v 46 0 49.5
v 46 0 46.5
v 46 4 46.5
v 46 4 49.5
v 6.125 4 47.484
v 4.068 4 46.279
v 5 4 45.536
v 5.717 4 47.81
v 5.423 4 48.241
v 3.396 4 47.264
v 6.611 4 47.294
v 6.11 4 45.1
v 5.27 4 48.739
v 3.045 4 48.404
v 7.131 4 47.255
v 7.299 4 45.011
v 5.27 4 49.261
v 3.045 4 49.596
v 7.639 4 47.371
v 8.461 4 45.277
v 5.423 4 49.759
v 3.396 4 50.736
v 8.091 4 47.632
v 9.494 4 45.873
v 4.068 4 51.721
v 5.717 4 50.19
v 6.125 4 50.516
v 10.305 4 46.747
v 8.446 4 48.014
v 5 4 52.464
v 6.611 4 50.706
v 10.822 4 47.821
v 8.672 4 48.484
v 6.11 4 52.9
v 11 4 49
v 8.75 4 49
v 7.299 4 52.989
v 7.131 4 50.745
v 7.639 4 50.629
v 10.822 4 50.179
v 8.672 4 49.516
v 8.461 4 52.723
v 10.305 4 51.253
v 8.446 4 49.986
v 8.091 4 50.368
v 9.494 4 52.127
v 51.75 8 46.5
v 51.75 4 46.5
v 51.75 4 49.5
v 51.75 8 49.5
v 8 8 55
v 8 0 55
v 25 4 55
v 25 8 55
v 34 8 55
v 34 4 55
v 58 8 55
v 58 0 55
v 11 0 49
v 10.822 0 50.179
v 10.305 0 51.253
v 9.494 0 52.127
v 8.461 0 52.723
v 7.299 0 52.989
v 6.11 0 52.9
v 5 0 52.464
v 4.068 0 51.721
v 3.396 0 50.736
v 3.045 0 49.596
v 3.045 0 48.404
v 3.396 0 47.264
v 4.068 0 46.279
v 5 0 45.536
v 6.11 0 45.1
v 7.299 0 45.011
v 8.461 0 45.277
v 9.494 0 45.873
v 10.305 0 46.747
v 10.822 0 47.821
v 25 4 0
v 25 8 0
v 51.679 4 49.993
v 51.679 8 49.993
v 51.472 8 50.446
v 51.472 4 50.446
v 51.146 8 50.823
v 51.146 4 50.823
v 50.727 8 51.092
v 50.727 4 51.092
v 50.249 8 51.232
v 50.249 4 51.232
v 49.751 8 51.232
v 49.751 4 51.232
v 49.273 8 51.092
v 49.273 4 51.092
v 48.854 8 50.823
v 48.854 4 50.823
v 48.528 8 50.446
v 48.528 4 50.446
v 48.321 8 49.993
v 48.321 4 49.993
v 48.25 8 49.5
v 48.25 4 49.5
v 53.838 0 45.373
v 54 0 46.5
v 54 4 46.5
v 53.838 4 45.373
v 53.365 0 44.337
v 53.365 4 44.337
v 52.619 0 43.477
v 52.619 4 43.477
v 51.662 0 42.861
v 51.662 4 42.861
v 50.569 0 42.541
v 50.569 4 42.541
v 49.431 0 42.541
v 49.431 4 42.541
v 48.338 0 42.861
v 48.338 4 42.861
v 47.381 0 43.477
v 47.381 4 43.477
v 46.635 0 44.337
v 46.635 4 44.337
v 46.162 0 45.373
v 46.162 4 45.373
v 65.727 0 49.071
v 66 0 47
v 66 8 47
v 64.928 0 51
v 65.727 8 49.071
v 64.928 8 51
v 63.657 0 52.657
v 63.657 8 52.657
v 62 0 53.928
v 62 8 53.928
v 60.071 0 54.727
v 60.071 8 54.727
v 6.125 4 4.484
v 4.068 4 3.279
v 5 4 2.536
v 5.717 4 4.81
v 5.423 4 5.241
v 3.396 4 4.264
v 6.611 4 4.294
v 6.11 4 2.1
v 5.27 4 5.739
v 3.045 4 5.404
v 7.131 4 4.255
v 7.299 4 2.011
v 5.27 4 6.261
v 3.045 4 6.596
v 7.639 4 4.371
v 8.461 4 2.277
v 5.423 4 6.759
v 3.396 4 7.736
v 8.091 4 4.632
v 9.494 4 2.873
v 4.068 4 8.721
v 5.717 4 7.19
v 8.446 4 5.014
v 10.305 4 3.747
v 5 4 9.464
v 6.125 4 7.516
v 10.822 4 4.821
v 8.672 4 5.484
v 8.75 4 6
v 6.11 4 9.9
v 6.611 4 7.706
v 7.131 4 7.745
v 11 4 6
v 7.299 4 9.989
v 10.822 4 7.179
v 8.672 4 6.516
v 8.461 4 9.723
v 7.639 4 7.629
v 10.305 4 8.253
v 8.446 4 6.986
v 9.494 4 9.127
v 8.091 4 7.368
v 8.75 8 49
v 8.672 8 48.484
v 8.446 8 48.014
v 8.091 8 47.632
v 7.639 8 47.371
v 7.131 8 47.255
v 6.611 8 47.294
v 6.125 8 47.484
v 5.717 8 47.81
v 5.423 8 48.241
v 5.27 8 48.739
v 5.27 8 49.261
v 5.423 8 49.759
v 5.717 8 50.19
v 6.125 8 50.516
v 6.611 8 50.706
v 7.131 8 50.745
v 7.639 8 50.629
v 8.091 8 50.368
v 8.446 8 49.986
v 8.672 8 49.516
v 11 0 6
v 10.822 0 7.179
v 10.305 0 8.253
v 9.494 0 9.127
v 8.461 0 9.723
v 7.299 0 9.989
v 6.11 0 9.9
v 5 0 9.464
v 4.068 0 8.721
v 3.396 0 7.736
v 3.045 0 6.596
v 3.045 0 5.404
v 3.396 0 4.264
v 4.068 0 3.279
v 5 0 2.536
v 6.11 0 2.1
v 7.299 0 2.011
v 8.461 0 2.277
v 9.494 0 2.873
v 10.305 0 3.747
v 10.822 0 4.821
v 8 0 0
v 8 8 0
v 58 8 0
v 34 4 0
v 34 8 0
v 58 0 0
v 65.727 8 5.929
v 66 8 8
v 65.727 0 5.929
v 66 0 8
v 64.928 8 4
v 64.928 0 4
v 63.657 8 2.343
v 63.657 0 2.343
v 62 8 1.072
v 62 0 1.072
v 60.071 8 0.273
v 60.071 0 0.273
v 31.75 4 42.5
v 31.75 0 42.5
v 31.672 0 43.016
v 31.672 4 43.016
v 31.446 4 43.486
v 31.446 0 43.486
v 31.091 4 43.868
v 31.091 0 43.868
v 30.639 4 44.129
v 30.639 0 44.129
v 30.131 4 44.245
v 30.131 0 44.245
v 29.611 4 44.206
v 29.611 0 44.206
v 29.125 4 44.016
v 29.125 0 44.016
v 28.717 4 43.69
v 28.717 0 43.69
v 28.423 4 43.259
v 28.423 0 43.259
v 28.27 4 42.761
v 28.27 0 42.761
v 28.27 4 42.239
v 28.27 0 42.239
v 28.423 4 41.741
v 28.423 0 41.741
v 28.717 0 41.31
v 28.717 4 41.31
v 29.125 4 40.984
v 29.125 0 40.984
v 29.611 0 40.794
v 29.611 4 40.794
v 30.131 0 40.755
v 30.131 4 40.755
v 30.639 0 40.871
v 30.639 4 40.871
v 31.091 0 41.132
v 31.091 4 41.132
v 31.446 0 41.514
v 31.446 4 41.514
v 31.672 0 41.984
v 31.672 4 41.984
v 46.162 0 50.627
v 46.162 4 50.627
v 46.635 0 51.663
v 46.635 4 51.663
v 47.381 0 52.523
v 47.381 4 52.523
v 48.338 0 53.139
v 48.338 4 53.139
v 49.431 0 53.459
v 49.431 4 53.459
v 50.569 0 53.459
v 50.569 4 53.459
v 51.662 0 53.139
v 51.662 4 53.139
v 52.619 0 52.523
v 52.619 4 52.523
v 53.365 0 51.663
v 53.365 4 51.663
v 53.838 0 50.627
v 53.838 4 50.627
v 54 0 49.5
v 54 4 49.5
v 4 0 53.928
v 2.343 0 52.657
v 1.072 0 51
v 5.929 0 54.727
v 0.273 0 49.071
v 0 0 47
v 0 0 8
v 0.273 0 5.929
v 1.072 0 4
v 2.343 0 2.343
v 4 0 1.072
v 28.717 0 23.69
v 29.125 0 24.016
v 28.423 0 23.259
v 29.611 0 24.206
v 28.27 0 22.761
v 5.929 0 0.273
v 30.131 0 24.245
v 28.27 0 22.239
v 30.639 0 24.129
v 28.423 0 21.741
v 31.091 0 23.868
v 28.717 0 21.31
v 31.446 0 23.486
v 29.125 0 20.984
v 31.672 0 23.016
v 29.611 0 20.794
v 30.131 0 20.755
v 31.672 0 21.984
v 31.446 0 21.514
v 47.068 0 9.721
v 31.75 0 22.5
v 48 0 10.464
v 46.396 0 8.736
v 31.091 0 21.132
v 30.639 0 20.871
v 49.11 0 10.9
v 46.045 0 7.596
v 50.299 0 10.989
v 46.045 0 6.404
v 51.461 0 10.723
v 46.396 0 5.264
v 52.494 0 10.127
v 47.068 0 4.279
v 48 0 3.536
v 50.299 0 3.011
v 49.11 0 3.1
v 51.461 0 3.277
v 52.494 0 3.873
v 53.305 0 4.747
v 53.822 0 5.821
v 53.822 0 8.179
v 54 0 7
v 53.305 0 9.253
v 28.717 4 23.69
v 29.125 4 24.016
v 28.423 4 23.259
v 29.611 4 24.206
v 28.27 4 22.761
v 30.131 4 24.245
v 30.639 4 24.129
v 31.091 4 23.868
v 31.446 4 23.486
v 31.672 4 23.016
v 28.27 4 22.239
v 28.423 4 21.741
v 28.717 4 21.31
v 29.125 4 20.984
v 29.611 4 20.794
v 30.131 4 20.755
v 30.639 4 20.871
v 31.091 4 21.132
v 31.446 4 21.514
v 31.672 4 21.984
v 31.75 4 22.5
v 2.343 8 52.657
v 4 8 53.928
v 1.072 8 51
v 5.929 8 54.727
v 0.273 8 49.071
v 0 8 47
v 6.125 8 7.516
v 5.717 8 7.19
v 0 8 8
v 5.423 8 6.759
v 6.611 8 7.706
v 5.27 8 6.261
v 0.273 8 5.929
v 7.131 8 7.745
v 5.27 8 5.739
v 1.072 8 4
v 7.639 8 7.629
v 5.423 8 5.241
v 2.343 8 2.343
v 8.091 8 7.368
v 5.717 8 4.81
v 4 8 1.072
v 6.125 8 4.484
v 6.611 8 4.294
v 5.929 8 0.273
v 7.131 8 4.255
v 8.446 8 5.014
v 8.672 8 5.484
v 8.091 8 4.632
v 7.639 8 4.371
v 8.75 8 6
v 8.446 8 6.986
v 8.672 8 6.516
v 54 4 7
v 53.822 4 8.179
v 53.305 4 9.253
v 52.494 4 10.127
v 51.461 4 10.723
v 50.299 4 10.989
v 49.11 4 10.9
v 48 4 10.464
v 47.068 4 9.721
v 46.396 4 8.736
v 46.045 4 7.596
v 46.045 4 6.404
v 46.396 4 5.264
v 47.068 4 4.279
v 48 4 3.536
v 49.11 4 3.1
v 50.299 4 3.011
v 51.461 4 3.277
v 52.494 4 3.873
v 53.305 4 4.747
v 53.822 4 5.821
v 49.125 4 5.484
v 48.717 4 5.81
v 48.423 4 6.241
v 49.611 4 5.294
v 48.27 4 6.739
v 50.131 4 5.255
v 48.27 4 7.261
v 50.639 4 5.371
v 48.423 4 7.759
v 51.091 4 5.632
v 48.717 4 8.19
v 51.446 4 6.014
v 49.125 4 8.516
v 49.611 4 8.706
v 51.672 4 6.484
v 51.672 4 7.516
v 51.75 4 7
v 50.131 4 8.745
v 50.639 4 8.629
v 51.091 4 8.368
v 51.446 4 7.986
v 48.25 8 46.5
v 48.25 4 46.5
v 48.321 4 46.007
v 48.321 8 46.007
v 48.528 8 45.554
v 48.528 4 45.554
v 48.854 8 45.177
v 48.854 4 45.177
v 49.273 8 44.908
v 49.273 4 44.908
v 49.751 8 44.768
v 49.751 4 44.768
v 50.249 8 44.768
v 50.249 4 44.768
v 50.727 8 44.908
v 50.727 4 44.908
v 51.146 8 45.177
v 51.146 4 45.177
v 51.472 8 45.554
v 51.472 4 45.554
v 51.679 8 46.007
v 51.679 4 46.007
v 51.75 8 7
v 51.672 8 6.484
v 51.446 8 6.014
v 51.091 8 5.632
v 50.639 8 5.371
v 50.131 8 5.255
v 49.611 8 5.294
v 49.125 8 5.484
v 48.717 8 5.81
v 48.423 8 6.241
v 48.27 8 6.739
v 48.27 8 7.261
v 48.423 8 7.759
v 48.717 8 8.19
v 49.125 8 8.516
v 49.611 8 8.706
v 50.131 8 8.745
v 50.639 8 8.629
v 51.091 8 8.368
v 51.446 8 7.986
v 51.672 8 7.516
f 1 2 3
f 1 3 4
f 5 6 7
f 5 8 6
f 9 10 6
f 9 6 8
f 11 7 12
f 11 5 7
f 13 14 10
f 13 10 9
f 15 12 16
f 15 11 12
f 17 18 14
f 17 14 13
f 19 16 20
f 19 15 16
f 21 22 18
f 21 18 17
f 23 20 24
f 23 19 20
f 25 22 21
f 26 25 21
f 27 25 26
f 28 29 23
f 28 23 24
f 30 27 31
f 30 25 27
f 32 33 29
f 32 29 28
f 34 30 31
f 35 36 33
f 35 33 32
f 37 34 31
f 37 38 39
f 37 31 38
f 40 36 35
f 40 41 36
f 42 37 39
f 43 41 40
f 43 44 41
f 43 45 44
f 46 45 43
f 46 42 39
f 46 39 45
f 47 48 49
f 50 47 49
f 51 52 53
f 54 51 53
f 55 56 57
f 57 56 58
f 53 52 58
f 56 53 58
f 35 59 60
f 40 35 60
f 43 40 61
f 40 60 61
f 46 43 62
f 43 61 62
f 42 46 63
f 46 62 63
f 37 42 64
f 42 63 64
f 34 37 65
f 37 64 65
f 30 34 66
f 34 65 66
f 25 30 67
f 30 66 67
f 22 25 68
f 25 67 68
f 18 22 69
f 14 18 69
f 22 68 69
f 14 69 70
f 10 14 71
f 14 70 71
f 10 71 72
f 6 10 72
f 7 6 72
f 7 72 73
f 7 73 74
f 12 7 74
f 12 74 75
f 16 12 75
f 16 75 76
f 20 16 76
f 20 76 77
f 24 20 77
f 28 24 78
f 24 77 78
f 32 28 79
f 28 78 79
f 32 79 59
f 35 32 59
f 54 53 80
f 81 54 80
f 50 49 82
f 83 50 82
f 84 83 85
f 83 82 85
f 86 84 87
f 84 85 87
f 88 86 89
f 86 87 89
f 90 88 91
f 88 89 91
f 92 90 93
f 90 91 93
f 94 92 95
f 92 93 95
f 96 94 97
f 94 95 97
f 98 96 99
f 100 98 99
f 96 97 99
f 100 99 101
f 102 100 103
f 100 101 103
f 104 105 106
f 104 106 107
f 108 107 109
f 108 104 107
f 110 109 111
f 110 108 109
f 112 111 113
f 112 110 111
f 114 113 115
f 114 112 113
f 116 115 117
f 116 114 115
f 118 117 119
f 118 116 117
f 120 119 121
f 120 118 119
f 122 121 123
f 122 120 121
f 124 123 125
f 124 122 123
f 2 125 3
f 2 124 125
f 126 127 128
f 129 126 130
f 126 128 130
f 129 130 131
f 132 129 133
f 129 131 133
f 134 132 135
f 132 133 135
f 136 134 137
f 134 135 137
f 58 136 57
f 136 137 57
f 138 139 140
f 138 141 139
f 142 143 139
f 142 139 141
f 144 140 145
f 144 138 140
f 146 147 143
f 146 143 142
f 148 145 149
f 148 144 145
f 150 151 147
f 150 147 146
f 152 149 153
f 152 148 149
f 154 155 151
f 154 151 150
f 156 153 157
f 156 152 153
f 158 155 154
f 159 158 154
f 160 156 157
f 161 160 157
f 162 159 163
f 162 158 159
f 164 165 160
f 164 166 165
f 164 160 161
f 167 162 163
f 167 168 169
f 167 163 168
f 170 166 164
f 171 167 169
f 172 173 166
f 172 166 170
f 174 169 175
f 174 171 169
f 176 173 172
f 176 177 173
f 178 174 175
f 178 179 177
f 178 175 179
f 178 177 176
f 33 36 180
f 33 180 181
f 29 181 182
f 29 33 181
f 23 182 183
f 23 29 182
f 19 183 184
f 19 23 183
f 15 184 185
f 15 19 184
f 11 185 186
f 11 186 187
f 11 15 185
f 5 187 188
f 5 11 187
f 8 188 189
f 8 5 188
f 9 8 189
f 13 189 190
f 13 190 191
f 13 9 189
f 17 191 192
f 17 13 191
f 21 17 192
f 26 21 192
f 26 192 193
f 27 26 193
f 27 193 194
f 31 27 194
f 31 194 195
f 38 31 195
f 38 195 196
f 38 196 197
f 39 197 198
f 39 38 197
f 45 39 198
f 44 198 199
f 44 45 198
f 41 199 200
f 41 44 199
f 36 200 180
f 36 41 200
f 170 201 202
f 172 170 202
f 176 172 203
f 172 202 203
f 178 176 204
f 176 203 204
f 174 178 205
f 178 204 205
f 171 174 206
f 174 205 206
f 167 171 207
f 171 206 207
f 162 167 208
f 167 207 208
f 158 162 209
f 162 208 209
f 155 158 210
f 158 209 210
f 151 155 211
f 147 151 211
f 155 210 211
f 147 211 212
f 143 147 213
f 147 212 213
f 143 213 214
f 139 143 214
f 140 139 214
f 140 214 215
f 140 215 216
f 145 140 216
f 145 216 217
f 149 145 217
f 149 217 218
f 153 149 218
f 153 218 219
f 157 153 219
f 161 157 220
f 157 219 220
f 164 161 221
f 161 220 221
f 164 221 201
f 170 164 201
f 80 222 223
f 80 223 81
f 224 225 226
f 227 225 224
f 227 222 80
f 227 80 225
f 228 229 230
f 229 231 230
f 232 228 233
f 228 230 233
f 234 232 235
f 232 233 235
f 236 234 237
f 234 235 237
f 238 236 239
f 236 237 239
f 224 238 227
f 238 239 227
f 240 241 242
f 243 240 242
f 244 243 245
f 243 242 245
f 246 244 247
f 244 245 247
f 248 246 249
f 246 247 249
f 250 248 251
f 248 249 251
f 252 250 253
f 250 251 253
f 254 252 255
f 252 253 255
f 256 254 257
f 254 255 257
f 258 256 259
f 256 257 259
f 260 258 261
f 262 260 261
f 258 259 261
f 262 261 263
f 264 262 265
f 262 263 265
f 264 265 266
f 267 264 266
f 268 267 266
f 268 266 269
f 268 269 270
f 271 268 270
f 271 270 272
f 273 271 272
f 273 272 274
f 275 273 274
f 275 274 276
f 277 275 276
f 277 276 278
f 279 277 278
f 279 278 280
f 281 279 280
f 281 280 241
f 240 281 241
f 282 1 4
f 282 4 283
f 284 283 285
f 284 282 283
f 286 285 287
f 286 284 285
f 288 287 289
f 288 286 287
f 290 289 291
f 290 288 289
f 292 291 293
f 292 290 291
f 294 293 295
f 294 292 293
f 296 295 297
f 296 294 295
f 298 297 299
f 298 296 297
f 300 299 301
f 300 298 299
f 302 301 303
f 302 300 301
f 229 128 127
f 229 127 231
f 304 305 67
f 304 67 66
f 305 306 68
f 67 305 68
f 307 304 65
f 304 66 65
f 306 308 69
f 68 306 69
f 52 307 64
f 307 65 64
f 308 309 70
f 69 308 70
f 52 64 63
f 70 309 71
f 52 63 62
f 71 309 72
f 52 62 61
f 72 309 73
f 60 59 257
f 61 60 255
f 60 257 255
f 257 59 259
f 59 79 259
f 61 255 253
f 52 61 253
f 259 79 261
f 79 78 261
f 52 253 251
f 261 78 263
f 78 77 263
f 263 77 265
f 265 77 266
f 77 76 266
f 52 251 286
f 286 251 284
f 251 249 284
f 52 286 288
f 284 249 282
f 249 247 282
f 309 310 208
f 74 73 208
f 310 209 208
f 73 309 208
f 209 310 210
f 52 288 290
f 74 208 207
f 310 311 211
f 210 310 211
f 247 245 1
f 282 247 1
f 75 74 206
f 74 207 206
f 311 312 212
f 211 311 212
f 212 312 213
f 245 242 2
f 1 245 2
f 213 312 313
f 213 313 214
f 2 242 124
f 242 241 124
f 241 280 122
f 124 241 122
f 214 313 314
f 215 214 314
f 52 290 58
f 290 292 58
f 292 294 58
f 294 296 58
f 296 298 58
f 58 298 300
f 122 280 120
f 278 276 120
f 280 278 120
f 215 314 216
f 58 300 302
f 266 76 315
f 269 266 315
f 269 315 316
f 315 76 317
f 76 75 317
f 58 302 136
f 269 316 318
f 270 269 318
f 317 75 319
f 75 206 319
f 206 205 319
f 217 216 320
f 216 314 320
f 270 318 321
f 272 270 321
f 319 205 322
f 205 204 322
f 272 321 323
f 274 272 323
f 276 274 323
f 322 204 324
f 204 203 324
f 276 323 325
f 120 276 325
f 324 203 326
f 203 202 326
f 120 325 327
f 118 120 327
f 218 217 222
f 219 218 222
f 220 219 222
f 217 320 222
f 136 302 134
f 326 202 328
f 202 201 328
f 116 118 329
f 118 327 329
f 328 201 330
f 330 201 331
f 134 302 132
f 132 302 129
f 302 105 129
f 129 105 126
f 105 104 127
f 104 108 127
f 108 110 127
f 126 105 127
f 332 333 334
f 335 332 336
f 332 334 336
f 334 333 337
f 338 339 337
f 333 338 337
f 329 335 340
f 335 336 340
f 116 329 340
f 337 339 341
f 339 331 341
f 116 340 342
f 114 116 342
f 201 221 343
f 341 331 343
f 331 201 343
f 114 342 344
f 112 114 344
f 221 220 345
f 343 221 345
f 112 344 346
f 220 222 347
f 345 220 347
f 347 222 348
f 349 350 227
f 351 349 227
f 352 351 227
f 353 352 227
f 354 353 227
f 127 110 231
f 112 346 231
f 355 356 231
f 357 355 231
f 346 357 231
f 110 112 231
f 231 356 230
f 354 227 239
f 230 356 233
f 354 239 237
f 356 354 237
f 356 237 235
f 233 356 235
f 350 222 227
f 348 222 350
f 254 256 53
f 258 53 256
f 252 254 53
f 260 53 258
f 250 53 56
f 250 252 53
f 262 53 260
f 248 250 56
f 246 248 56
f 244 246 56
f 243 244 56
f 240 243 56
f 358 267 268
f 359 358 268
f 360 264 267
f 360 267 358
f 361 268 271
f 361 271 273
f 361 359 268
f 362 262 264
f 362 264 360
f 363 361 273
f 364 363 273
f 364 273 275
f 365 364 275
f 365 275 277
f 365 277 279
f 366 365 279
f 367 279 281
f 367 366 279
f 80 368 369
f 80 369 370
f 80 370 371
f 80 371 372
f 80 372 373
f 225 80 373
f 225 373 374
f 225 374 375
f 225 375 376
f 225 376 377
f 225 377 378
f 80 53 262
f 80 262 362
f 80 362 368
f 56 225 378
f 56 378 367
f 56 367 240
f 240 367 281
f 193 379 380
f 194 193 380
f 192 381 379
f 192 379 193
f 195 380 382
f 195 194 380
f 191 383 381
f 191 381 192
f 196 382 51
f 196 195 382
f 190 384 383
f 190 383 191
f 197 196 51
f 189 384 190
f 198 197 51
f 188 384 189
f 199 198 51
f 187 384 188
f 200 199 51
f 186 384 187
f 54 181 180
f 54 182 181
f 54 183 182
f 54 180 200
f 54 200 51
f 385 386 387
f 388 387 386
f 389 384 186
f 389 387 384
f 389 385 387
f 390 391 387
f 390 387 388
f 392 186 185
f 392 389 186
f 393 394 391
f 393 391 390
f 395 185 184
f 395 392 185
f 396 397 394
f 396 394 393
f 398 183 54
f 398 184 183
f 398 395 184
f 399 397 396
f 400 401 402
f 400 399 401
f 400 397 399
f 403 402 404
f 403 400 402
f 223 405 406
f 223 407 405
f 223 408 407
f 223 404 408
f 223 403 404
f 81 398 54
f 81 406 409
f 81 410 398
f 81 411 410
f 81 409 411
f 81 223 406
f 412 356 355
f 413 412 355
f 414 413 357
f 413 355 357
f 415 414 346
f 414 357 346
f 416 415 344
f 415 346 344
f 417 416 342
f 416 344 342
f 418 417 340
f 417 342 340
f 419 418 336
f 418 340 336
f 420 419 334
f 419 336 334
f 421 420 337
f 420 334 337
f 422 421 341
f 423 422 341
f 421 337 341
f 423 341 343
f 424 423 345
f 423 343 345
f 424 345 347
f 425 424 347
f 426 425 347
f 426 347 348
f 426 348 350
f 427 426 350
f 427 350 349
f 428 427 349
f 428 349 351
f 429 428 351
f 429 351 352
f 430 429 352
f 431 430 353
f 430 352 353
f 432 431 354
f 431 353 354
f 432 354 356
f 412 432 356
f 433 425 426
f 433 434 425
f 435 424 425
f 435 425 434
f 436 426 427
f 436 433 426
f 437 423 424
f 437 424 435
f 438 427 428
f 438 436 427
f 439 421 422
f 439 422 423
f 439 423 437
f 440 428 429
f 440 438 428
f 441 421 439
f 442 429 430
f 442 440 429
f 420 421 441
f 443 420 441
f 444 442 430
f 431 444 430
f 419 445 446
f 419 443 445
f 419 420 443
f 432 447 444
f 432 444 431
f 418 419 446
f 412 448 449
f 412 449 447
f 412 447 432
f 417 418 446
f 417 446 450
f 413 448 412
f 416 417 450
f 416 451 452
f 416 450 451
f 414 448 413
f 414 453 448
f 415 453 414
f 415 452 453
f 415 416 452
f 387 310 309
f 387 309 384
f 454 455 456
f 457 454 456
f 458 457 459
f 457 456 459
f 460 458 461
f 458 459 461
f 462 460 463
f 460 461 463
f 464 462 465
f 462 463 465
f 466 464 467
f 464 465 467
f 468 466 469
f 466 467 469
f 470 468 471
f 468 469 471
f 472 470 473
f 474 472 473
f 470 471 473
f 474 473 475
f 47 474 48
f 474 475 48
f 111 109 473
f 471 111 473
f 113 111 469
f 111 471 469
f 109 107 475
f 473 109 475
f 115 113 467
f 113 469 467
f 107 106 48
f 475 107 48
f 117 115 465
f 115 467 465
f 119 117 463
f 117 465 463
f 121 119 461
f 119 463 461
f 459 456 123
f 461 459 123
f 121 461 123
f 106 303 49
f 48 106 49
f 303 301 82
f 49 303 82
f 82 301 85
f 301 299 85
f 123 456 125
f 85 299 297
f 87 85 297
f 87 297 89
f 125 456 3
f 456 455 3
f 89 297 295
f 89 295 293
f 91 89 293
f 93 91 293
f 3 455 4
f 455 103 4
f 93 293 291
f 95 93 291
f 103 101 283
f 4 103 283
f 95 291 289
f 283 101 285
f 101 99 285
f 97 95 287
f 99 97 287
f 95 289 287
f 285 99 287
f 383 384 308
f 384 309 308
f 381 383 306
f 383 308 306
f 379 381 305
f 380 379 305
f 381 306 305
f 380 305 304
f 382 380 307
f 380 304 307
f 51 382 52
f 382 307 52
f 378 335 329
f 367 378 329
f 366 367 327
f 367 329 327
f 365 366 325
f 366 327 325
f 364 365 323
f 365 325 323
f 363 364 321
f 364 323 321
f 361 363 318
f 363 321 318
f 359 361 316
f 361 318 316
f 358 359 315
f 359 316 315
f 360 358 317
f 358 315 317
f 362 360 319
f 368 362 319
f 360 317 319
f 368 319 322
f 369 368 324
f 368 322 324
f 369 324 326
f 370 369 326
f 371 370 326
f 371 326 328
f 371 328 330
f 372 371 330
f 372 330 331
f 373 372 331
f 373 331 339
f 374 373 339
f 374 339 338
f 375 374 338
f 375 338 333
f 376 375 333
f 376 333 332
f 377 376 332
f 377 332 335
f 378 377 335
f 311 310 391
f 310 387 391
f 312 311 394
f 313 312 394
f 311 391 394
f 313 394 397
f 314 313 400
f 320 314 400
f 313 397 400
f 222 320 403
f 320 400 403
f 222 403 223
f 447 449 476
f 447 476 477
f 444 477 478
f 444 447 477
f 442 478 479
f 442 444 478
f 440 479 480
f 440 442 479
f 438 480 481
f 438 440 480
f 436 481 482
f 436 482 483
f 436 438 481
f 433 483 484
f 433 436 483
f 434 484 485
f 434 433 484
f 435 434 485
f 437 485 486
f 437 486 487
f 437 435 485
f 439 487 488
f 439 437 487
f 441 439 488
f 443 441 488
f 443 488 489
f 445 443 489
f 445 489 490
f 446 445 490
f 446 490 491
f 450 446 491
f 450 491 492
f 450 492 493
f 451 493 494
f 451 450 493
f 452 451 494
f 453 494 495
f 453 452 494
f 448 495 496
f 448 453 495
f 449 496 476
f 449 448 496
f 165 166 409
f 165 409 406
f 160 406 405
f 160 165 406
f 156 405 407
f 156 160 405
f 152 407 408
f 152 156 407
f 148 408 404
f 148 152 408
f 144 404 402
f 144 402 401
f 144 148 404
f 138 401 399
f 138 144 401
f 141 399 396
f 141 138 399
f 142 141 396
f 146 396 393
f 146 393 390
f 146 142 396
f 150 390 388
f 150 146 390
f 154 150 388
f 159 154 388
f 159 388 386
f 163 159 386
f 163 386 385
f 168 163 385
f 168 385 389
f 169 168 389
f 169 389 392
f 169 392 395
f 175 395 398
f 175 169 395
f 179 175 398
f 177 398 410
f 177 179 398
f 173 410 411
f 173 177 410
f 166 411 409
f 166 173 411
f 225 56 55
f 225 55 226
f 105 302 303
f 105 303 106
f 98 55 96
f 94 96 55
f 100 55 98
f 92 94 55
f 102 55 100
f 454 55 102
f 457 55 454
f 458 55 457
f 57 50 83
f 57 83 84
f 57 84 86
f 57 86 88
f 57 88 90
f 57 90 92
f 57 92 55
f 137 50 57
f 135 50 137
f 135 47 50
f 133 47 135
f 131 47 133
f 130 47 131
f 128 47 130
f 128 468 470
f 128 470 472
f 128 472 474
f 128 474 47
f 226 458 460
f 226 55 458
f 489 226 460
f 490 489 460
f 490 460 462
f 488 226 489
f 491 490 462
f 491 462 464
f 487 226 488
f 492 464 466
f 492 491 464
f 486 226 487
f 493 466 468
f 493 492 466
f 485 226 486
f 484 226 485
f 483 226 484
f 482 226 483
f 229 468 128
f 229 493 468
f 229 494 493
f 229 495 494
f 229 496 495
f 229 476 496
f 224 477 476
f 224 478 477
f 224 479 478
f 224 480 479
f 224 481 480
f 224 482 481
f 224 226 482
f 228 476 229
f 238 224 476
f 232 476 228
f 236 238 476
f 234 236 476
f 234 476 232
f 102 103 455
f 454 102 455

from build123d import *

# Parameters (mm, degrees)
ESBO_O1_W                = 75
ESBO_O1_H                = 4
RESSALTO_EXTRUS_O1_DEPTH = 55
ESBO_O4_R                = 1.75
CORTE_EXTRUS_O2_DEPTH    = 5
ESBO_O5_W                = 32
ESBO_O5_H                = 55
ESBO_O5_R                = 1.75
ESBO_O5_W_2              = 25
RESSALTO_EXTRUS_O2_DEPTH = 4
ESBO_O6_R                = 4
CORTE_EXTRUS_O3_DEPTH    = 4
ESBO_O7_W                = 9
ESBO_O7_H                = 55
CORTE_EXTRUS_O4_DEPTH    = 10
FILETE1_R                = 8


with BuildPart() as part:
    # Esboço1 → Ressalto-extrusão1 (new body)
    with BuildSketch(Plane.XY):
        with Locations((37.5, 2)):
            Rectangle(ESBO_O1_W, ESBO_O1_H)
    extrude(amount=RESSALTO_EXTRUS_O1_DEPTH)

    # Esboço4 → Corte-extrusão2 (cut, through all)
    with BuildSketch(Plane.XZ):
        with Locations((50, 7)):
            Circle(ESBO_O4_R)
        with Locations((30, 22.5)):
            Circle(ESBO_O4_R)
        with Locations((30, 42.5)):
            Circle(ESBO_O4_R)
        with Locations((7, 49)):
            Circle(ESBO_O4_R)
        with Locations((7, 6)):
            Circle(ESBO_O4_R)
        with BuildLine():
            Line((51.75, 49.5), (51.75, 46.5))
            ThreePointArc((51.75, 46.5), (50, 44.75), (48.25, 46.5))
            Line((48.25, 46.5), (48.25, 49.5))
            ThreePointArc((48.25, 49.5), (50, 51.25), (51.75, 49.5))
        make_face()
    extrude(amount=-CORTE_EXTRUS_O2_DEPTH, mode=Mode.SUBTRACT)

    # Esboço5 → Ressalto-extrusão2 (add)
    with BuildSketch(Plane(origin=(0, 4, 0), x_dir=(1, 0, 0), z_dir=(0, 1, 0))):
        with Locations((50, -27.5)):
            Rectangle(ESBO_O5_W, ESBO_O5_H)
        with Locations((50, -7)):
            Circle(ESBO_O5_R, mode=Mode.SUBTRACT)
        with BuildLine():
            Line((48.25, -49.5), (48.25, -46.5))
            ThreePointArc((48.25, -46.5), (50, -44.75), (51.75, -46.5))
            Line((51.75, -46.5), (51.75, -49.5))
            ThreePointArc((51.75, -49.5), (50, -51.25), (48.25, -49.5))
        make_face(mode=Mode.SUBTRACT)
        with Locations((12.5, -27.5)):
            Rectangle(ESBO_O5_W_2, ESBO_O5_H)
        with Locations((7, -49)):
            Circle(ESBO_O5_R, mode=Mode.SUBTRACT)
        with Locations((7, -6)):
            Circle(ESBO_O5_R, mode=Mode.SUBTRACT)
    extrude(amount=RESSALTO_EXTRUS_O2_DEPTH)

    # Esboço6 → Corte-extrusão3 (cut)
    with BuildSketch(Plane.XZ):
        with Locations((50, 7)):
            Circle(ESBO_O6_R)
        with Locations((7, 6)):
            Circle(ESBO_O6_R)
        with Locations((7, 49)):
            Circle(ESBO_O6_R)
        with BuildLine():
            Line((46, 46.5), (46, 49.5))
            ThreePointArc((46, 49.5), (50, 53.5), (54, 49.5))
            Line((54, 49.5), (54, 46.5))
            ThreePointArc((54, 46.5), (50, 42.5), (46, 46.5))
        make_face()
    extrude(amount=-CORTE_EXTRUS_O3_DEPTH, mode=Mode.SUBTRACT)

    # Esboço7 → Corte-extrusão4 (cut)
    with BuildSketch(Plane(origin=(0, 4, 0), x_dir=(1, 0, 0), z_dir=(0, 1, 0))):
        with Locations((70.5, -27.5)):
            Rectangle(ESBO_O7_W, ESBO_O7_H)
    extrude(amount=-CORTE_EXTRUS_O4_DEPTH, mode=Mode.SUBTRACT)

    # Filete1
    filete1_edges = [part.edges().sort_by_distance(p)[0] for p in [
        (0, 4, 55),
        (66, 4, 55),
        (66, 4, 0),
        (0, 4, 0),
    ]]
    fillet(filete1_edges, radius=FILETE1_R)


solid = part.part
